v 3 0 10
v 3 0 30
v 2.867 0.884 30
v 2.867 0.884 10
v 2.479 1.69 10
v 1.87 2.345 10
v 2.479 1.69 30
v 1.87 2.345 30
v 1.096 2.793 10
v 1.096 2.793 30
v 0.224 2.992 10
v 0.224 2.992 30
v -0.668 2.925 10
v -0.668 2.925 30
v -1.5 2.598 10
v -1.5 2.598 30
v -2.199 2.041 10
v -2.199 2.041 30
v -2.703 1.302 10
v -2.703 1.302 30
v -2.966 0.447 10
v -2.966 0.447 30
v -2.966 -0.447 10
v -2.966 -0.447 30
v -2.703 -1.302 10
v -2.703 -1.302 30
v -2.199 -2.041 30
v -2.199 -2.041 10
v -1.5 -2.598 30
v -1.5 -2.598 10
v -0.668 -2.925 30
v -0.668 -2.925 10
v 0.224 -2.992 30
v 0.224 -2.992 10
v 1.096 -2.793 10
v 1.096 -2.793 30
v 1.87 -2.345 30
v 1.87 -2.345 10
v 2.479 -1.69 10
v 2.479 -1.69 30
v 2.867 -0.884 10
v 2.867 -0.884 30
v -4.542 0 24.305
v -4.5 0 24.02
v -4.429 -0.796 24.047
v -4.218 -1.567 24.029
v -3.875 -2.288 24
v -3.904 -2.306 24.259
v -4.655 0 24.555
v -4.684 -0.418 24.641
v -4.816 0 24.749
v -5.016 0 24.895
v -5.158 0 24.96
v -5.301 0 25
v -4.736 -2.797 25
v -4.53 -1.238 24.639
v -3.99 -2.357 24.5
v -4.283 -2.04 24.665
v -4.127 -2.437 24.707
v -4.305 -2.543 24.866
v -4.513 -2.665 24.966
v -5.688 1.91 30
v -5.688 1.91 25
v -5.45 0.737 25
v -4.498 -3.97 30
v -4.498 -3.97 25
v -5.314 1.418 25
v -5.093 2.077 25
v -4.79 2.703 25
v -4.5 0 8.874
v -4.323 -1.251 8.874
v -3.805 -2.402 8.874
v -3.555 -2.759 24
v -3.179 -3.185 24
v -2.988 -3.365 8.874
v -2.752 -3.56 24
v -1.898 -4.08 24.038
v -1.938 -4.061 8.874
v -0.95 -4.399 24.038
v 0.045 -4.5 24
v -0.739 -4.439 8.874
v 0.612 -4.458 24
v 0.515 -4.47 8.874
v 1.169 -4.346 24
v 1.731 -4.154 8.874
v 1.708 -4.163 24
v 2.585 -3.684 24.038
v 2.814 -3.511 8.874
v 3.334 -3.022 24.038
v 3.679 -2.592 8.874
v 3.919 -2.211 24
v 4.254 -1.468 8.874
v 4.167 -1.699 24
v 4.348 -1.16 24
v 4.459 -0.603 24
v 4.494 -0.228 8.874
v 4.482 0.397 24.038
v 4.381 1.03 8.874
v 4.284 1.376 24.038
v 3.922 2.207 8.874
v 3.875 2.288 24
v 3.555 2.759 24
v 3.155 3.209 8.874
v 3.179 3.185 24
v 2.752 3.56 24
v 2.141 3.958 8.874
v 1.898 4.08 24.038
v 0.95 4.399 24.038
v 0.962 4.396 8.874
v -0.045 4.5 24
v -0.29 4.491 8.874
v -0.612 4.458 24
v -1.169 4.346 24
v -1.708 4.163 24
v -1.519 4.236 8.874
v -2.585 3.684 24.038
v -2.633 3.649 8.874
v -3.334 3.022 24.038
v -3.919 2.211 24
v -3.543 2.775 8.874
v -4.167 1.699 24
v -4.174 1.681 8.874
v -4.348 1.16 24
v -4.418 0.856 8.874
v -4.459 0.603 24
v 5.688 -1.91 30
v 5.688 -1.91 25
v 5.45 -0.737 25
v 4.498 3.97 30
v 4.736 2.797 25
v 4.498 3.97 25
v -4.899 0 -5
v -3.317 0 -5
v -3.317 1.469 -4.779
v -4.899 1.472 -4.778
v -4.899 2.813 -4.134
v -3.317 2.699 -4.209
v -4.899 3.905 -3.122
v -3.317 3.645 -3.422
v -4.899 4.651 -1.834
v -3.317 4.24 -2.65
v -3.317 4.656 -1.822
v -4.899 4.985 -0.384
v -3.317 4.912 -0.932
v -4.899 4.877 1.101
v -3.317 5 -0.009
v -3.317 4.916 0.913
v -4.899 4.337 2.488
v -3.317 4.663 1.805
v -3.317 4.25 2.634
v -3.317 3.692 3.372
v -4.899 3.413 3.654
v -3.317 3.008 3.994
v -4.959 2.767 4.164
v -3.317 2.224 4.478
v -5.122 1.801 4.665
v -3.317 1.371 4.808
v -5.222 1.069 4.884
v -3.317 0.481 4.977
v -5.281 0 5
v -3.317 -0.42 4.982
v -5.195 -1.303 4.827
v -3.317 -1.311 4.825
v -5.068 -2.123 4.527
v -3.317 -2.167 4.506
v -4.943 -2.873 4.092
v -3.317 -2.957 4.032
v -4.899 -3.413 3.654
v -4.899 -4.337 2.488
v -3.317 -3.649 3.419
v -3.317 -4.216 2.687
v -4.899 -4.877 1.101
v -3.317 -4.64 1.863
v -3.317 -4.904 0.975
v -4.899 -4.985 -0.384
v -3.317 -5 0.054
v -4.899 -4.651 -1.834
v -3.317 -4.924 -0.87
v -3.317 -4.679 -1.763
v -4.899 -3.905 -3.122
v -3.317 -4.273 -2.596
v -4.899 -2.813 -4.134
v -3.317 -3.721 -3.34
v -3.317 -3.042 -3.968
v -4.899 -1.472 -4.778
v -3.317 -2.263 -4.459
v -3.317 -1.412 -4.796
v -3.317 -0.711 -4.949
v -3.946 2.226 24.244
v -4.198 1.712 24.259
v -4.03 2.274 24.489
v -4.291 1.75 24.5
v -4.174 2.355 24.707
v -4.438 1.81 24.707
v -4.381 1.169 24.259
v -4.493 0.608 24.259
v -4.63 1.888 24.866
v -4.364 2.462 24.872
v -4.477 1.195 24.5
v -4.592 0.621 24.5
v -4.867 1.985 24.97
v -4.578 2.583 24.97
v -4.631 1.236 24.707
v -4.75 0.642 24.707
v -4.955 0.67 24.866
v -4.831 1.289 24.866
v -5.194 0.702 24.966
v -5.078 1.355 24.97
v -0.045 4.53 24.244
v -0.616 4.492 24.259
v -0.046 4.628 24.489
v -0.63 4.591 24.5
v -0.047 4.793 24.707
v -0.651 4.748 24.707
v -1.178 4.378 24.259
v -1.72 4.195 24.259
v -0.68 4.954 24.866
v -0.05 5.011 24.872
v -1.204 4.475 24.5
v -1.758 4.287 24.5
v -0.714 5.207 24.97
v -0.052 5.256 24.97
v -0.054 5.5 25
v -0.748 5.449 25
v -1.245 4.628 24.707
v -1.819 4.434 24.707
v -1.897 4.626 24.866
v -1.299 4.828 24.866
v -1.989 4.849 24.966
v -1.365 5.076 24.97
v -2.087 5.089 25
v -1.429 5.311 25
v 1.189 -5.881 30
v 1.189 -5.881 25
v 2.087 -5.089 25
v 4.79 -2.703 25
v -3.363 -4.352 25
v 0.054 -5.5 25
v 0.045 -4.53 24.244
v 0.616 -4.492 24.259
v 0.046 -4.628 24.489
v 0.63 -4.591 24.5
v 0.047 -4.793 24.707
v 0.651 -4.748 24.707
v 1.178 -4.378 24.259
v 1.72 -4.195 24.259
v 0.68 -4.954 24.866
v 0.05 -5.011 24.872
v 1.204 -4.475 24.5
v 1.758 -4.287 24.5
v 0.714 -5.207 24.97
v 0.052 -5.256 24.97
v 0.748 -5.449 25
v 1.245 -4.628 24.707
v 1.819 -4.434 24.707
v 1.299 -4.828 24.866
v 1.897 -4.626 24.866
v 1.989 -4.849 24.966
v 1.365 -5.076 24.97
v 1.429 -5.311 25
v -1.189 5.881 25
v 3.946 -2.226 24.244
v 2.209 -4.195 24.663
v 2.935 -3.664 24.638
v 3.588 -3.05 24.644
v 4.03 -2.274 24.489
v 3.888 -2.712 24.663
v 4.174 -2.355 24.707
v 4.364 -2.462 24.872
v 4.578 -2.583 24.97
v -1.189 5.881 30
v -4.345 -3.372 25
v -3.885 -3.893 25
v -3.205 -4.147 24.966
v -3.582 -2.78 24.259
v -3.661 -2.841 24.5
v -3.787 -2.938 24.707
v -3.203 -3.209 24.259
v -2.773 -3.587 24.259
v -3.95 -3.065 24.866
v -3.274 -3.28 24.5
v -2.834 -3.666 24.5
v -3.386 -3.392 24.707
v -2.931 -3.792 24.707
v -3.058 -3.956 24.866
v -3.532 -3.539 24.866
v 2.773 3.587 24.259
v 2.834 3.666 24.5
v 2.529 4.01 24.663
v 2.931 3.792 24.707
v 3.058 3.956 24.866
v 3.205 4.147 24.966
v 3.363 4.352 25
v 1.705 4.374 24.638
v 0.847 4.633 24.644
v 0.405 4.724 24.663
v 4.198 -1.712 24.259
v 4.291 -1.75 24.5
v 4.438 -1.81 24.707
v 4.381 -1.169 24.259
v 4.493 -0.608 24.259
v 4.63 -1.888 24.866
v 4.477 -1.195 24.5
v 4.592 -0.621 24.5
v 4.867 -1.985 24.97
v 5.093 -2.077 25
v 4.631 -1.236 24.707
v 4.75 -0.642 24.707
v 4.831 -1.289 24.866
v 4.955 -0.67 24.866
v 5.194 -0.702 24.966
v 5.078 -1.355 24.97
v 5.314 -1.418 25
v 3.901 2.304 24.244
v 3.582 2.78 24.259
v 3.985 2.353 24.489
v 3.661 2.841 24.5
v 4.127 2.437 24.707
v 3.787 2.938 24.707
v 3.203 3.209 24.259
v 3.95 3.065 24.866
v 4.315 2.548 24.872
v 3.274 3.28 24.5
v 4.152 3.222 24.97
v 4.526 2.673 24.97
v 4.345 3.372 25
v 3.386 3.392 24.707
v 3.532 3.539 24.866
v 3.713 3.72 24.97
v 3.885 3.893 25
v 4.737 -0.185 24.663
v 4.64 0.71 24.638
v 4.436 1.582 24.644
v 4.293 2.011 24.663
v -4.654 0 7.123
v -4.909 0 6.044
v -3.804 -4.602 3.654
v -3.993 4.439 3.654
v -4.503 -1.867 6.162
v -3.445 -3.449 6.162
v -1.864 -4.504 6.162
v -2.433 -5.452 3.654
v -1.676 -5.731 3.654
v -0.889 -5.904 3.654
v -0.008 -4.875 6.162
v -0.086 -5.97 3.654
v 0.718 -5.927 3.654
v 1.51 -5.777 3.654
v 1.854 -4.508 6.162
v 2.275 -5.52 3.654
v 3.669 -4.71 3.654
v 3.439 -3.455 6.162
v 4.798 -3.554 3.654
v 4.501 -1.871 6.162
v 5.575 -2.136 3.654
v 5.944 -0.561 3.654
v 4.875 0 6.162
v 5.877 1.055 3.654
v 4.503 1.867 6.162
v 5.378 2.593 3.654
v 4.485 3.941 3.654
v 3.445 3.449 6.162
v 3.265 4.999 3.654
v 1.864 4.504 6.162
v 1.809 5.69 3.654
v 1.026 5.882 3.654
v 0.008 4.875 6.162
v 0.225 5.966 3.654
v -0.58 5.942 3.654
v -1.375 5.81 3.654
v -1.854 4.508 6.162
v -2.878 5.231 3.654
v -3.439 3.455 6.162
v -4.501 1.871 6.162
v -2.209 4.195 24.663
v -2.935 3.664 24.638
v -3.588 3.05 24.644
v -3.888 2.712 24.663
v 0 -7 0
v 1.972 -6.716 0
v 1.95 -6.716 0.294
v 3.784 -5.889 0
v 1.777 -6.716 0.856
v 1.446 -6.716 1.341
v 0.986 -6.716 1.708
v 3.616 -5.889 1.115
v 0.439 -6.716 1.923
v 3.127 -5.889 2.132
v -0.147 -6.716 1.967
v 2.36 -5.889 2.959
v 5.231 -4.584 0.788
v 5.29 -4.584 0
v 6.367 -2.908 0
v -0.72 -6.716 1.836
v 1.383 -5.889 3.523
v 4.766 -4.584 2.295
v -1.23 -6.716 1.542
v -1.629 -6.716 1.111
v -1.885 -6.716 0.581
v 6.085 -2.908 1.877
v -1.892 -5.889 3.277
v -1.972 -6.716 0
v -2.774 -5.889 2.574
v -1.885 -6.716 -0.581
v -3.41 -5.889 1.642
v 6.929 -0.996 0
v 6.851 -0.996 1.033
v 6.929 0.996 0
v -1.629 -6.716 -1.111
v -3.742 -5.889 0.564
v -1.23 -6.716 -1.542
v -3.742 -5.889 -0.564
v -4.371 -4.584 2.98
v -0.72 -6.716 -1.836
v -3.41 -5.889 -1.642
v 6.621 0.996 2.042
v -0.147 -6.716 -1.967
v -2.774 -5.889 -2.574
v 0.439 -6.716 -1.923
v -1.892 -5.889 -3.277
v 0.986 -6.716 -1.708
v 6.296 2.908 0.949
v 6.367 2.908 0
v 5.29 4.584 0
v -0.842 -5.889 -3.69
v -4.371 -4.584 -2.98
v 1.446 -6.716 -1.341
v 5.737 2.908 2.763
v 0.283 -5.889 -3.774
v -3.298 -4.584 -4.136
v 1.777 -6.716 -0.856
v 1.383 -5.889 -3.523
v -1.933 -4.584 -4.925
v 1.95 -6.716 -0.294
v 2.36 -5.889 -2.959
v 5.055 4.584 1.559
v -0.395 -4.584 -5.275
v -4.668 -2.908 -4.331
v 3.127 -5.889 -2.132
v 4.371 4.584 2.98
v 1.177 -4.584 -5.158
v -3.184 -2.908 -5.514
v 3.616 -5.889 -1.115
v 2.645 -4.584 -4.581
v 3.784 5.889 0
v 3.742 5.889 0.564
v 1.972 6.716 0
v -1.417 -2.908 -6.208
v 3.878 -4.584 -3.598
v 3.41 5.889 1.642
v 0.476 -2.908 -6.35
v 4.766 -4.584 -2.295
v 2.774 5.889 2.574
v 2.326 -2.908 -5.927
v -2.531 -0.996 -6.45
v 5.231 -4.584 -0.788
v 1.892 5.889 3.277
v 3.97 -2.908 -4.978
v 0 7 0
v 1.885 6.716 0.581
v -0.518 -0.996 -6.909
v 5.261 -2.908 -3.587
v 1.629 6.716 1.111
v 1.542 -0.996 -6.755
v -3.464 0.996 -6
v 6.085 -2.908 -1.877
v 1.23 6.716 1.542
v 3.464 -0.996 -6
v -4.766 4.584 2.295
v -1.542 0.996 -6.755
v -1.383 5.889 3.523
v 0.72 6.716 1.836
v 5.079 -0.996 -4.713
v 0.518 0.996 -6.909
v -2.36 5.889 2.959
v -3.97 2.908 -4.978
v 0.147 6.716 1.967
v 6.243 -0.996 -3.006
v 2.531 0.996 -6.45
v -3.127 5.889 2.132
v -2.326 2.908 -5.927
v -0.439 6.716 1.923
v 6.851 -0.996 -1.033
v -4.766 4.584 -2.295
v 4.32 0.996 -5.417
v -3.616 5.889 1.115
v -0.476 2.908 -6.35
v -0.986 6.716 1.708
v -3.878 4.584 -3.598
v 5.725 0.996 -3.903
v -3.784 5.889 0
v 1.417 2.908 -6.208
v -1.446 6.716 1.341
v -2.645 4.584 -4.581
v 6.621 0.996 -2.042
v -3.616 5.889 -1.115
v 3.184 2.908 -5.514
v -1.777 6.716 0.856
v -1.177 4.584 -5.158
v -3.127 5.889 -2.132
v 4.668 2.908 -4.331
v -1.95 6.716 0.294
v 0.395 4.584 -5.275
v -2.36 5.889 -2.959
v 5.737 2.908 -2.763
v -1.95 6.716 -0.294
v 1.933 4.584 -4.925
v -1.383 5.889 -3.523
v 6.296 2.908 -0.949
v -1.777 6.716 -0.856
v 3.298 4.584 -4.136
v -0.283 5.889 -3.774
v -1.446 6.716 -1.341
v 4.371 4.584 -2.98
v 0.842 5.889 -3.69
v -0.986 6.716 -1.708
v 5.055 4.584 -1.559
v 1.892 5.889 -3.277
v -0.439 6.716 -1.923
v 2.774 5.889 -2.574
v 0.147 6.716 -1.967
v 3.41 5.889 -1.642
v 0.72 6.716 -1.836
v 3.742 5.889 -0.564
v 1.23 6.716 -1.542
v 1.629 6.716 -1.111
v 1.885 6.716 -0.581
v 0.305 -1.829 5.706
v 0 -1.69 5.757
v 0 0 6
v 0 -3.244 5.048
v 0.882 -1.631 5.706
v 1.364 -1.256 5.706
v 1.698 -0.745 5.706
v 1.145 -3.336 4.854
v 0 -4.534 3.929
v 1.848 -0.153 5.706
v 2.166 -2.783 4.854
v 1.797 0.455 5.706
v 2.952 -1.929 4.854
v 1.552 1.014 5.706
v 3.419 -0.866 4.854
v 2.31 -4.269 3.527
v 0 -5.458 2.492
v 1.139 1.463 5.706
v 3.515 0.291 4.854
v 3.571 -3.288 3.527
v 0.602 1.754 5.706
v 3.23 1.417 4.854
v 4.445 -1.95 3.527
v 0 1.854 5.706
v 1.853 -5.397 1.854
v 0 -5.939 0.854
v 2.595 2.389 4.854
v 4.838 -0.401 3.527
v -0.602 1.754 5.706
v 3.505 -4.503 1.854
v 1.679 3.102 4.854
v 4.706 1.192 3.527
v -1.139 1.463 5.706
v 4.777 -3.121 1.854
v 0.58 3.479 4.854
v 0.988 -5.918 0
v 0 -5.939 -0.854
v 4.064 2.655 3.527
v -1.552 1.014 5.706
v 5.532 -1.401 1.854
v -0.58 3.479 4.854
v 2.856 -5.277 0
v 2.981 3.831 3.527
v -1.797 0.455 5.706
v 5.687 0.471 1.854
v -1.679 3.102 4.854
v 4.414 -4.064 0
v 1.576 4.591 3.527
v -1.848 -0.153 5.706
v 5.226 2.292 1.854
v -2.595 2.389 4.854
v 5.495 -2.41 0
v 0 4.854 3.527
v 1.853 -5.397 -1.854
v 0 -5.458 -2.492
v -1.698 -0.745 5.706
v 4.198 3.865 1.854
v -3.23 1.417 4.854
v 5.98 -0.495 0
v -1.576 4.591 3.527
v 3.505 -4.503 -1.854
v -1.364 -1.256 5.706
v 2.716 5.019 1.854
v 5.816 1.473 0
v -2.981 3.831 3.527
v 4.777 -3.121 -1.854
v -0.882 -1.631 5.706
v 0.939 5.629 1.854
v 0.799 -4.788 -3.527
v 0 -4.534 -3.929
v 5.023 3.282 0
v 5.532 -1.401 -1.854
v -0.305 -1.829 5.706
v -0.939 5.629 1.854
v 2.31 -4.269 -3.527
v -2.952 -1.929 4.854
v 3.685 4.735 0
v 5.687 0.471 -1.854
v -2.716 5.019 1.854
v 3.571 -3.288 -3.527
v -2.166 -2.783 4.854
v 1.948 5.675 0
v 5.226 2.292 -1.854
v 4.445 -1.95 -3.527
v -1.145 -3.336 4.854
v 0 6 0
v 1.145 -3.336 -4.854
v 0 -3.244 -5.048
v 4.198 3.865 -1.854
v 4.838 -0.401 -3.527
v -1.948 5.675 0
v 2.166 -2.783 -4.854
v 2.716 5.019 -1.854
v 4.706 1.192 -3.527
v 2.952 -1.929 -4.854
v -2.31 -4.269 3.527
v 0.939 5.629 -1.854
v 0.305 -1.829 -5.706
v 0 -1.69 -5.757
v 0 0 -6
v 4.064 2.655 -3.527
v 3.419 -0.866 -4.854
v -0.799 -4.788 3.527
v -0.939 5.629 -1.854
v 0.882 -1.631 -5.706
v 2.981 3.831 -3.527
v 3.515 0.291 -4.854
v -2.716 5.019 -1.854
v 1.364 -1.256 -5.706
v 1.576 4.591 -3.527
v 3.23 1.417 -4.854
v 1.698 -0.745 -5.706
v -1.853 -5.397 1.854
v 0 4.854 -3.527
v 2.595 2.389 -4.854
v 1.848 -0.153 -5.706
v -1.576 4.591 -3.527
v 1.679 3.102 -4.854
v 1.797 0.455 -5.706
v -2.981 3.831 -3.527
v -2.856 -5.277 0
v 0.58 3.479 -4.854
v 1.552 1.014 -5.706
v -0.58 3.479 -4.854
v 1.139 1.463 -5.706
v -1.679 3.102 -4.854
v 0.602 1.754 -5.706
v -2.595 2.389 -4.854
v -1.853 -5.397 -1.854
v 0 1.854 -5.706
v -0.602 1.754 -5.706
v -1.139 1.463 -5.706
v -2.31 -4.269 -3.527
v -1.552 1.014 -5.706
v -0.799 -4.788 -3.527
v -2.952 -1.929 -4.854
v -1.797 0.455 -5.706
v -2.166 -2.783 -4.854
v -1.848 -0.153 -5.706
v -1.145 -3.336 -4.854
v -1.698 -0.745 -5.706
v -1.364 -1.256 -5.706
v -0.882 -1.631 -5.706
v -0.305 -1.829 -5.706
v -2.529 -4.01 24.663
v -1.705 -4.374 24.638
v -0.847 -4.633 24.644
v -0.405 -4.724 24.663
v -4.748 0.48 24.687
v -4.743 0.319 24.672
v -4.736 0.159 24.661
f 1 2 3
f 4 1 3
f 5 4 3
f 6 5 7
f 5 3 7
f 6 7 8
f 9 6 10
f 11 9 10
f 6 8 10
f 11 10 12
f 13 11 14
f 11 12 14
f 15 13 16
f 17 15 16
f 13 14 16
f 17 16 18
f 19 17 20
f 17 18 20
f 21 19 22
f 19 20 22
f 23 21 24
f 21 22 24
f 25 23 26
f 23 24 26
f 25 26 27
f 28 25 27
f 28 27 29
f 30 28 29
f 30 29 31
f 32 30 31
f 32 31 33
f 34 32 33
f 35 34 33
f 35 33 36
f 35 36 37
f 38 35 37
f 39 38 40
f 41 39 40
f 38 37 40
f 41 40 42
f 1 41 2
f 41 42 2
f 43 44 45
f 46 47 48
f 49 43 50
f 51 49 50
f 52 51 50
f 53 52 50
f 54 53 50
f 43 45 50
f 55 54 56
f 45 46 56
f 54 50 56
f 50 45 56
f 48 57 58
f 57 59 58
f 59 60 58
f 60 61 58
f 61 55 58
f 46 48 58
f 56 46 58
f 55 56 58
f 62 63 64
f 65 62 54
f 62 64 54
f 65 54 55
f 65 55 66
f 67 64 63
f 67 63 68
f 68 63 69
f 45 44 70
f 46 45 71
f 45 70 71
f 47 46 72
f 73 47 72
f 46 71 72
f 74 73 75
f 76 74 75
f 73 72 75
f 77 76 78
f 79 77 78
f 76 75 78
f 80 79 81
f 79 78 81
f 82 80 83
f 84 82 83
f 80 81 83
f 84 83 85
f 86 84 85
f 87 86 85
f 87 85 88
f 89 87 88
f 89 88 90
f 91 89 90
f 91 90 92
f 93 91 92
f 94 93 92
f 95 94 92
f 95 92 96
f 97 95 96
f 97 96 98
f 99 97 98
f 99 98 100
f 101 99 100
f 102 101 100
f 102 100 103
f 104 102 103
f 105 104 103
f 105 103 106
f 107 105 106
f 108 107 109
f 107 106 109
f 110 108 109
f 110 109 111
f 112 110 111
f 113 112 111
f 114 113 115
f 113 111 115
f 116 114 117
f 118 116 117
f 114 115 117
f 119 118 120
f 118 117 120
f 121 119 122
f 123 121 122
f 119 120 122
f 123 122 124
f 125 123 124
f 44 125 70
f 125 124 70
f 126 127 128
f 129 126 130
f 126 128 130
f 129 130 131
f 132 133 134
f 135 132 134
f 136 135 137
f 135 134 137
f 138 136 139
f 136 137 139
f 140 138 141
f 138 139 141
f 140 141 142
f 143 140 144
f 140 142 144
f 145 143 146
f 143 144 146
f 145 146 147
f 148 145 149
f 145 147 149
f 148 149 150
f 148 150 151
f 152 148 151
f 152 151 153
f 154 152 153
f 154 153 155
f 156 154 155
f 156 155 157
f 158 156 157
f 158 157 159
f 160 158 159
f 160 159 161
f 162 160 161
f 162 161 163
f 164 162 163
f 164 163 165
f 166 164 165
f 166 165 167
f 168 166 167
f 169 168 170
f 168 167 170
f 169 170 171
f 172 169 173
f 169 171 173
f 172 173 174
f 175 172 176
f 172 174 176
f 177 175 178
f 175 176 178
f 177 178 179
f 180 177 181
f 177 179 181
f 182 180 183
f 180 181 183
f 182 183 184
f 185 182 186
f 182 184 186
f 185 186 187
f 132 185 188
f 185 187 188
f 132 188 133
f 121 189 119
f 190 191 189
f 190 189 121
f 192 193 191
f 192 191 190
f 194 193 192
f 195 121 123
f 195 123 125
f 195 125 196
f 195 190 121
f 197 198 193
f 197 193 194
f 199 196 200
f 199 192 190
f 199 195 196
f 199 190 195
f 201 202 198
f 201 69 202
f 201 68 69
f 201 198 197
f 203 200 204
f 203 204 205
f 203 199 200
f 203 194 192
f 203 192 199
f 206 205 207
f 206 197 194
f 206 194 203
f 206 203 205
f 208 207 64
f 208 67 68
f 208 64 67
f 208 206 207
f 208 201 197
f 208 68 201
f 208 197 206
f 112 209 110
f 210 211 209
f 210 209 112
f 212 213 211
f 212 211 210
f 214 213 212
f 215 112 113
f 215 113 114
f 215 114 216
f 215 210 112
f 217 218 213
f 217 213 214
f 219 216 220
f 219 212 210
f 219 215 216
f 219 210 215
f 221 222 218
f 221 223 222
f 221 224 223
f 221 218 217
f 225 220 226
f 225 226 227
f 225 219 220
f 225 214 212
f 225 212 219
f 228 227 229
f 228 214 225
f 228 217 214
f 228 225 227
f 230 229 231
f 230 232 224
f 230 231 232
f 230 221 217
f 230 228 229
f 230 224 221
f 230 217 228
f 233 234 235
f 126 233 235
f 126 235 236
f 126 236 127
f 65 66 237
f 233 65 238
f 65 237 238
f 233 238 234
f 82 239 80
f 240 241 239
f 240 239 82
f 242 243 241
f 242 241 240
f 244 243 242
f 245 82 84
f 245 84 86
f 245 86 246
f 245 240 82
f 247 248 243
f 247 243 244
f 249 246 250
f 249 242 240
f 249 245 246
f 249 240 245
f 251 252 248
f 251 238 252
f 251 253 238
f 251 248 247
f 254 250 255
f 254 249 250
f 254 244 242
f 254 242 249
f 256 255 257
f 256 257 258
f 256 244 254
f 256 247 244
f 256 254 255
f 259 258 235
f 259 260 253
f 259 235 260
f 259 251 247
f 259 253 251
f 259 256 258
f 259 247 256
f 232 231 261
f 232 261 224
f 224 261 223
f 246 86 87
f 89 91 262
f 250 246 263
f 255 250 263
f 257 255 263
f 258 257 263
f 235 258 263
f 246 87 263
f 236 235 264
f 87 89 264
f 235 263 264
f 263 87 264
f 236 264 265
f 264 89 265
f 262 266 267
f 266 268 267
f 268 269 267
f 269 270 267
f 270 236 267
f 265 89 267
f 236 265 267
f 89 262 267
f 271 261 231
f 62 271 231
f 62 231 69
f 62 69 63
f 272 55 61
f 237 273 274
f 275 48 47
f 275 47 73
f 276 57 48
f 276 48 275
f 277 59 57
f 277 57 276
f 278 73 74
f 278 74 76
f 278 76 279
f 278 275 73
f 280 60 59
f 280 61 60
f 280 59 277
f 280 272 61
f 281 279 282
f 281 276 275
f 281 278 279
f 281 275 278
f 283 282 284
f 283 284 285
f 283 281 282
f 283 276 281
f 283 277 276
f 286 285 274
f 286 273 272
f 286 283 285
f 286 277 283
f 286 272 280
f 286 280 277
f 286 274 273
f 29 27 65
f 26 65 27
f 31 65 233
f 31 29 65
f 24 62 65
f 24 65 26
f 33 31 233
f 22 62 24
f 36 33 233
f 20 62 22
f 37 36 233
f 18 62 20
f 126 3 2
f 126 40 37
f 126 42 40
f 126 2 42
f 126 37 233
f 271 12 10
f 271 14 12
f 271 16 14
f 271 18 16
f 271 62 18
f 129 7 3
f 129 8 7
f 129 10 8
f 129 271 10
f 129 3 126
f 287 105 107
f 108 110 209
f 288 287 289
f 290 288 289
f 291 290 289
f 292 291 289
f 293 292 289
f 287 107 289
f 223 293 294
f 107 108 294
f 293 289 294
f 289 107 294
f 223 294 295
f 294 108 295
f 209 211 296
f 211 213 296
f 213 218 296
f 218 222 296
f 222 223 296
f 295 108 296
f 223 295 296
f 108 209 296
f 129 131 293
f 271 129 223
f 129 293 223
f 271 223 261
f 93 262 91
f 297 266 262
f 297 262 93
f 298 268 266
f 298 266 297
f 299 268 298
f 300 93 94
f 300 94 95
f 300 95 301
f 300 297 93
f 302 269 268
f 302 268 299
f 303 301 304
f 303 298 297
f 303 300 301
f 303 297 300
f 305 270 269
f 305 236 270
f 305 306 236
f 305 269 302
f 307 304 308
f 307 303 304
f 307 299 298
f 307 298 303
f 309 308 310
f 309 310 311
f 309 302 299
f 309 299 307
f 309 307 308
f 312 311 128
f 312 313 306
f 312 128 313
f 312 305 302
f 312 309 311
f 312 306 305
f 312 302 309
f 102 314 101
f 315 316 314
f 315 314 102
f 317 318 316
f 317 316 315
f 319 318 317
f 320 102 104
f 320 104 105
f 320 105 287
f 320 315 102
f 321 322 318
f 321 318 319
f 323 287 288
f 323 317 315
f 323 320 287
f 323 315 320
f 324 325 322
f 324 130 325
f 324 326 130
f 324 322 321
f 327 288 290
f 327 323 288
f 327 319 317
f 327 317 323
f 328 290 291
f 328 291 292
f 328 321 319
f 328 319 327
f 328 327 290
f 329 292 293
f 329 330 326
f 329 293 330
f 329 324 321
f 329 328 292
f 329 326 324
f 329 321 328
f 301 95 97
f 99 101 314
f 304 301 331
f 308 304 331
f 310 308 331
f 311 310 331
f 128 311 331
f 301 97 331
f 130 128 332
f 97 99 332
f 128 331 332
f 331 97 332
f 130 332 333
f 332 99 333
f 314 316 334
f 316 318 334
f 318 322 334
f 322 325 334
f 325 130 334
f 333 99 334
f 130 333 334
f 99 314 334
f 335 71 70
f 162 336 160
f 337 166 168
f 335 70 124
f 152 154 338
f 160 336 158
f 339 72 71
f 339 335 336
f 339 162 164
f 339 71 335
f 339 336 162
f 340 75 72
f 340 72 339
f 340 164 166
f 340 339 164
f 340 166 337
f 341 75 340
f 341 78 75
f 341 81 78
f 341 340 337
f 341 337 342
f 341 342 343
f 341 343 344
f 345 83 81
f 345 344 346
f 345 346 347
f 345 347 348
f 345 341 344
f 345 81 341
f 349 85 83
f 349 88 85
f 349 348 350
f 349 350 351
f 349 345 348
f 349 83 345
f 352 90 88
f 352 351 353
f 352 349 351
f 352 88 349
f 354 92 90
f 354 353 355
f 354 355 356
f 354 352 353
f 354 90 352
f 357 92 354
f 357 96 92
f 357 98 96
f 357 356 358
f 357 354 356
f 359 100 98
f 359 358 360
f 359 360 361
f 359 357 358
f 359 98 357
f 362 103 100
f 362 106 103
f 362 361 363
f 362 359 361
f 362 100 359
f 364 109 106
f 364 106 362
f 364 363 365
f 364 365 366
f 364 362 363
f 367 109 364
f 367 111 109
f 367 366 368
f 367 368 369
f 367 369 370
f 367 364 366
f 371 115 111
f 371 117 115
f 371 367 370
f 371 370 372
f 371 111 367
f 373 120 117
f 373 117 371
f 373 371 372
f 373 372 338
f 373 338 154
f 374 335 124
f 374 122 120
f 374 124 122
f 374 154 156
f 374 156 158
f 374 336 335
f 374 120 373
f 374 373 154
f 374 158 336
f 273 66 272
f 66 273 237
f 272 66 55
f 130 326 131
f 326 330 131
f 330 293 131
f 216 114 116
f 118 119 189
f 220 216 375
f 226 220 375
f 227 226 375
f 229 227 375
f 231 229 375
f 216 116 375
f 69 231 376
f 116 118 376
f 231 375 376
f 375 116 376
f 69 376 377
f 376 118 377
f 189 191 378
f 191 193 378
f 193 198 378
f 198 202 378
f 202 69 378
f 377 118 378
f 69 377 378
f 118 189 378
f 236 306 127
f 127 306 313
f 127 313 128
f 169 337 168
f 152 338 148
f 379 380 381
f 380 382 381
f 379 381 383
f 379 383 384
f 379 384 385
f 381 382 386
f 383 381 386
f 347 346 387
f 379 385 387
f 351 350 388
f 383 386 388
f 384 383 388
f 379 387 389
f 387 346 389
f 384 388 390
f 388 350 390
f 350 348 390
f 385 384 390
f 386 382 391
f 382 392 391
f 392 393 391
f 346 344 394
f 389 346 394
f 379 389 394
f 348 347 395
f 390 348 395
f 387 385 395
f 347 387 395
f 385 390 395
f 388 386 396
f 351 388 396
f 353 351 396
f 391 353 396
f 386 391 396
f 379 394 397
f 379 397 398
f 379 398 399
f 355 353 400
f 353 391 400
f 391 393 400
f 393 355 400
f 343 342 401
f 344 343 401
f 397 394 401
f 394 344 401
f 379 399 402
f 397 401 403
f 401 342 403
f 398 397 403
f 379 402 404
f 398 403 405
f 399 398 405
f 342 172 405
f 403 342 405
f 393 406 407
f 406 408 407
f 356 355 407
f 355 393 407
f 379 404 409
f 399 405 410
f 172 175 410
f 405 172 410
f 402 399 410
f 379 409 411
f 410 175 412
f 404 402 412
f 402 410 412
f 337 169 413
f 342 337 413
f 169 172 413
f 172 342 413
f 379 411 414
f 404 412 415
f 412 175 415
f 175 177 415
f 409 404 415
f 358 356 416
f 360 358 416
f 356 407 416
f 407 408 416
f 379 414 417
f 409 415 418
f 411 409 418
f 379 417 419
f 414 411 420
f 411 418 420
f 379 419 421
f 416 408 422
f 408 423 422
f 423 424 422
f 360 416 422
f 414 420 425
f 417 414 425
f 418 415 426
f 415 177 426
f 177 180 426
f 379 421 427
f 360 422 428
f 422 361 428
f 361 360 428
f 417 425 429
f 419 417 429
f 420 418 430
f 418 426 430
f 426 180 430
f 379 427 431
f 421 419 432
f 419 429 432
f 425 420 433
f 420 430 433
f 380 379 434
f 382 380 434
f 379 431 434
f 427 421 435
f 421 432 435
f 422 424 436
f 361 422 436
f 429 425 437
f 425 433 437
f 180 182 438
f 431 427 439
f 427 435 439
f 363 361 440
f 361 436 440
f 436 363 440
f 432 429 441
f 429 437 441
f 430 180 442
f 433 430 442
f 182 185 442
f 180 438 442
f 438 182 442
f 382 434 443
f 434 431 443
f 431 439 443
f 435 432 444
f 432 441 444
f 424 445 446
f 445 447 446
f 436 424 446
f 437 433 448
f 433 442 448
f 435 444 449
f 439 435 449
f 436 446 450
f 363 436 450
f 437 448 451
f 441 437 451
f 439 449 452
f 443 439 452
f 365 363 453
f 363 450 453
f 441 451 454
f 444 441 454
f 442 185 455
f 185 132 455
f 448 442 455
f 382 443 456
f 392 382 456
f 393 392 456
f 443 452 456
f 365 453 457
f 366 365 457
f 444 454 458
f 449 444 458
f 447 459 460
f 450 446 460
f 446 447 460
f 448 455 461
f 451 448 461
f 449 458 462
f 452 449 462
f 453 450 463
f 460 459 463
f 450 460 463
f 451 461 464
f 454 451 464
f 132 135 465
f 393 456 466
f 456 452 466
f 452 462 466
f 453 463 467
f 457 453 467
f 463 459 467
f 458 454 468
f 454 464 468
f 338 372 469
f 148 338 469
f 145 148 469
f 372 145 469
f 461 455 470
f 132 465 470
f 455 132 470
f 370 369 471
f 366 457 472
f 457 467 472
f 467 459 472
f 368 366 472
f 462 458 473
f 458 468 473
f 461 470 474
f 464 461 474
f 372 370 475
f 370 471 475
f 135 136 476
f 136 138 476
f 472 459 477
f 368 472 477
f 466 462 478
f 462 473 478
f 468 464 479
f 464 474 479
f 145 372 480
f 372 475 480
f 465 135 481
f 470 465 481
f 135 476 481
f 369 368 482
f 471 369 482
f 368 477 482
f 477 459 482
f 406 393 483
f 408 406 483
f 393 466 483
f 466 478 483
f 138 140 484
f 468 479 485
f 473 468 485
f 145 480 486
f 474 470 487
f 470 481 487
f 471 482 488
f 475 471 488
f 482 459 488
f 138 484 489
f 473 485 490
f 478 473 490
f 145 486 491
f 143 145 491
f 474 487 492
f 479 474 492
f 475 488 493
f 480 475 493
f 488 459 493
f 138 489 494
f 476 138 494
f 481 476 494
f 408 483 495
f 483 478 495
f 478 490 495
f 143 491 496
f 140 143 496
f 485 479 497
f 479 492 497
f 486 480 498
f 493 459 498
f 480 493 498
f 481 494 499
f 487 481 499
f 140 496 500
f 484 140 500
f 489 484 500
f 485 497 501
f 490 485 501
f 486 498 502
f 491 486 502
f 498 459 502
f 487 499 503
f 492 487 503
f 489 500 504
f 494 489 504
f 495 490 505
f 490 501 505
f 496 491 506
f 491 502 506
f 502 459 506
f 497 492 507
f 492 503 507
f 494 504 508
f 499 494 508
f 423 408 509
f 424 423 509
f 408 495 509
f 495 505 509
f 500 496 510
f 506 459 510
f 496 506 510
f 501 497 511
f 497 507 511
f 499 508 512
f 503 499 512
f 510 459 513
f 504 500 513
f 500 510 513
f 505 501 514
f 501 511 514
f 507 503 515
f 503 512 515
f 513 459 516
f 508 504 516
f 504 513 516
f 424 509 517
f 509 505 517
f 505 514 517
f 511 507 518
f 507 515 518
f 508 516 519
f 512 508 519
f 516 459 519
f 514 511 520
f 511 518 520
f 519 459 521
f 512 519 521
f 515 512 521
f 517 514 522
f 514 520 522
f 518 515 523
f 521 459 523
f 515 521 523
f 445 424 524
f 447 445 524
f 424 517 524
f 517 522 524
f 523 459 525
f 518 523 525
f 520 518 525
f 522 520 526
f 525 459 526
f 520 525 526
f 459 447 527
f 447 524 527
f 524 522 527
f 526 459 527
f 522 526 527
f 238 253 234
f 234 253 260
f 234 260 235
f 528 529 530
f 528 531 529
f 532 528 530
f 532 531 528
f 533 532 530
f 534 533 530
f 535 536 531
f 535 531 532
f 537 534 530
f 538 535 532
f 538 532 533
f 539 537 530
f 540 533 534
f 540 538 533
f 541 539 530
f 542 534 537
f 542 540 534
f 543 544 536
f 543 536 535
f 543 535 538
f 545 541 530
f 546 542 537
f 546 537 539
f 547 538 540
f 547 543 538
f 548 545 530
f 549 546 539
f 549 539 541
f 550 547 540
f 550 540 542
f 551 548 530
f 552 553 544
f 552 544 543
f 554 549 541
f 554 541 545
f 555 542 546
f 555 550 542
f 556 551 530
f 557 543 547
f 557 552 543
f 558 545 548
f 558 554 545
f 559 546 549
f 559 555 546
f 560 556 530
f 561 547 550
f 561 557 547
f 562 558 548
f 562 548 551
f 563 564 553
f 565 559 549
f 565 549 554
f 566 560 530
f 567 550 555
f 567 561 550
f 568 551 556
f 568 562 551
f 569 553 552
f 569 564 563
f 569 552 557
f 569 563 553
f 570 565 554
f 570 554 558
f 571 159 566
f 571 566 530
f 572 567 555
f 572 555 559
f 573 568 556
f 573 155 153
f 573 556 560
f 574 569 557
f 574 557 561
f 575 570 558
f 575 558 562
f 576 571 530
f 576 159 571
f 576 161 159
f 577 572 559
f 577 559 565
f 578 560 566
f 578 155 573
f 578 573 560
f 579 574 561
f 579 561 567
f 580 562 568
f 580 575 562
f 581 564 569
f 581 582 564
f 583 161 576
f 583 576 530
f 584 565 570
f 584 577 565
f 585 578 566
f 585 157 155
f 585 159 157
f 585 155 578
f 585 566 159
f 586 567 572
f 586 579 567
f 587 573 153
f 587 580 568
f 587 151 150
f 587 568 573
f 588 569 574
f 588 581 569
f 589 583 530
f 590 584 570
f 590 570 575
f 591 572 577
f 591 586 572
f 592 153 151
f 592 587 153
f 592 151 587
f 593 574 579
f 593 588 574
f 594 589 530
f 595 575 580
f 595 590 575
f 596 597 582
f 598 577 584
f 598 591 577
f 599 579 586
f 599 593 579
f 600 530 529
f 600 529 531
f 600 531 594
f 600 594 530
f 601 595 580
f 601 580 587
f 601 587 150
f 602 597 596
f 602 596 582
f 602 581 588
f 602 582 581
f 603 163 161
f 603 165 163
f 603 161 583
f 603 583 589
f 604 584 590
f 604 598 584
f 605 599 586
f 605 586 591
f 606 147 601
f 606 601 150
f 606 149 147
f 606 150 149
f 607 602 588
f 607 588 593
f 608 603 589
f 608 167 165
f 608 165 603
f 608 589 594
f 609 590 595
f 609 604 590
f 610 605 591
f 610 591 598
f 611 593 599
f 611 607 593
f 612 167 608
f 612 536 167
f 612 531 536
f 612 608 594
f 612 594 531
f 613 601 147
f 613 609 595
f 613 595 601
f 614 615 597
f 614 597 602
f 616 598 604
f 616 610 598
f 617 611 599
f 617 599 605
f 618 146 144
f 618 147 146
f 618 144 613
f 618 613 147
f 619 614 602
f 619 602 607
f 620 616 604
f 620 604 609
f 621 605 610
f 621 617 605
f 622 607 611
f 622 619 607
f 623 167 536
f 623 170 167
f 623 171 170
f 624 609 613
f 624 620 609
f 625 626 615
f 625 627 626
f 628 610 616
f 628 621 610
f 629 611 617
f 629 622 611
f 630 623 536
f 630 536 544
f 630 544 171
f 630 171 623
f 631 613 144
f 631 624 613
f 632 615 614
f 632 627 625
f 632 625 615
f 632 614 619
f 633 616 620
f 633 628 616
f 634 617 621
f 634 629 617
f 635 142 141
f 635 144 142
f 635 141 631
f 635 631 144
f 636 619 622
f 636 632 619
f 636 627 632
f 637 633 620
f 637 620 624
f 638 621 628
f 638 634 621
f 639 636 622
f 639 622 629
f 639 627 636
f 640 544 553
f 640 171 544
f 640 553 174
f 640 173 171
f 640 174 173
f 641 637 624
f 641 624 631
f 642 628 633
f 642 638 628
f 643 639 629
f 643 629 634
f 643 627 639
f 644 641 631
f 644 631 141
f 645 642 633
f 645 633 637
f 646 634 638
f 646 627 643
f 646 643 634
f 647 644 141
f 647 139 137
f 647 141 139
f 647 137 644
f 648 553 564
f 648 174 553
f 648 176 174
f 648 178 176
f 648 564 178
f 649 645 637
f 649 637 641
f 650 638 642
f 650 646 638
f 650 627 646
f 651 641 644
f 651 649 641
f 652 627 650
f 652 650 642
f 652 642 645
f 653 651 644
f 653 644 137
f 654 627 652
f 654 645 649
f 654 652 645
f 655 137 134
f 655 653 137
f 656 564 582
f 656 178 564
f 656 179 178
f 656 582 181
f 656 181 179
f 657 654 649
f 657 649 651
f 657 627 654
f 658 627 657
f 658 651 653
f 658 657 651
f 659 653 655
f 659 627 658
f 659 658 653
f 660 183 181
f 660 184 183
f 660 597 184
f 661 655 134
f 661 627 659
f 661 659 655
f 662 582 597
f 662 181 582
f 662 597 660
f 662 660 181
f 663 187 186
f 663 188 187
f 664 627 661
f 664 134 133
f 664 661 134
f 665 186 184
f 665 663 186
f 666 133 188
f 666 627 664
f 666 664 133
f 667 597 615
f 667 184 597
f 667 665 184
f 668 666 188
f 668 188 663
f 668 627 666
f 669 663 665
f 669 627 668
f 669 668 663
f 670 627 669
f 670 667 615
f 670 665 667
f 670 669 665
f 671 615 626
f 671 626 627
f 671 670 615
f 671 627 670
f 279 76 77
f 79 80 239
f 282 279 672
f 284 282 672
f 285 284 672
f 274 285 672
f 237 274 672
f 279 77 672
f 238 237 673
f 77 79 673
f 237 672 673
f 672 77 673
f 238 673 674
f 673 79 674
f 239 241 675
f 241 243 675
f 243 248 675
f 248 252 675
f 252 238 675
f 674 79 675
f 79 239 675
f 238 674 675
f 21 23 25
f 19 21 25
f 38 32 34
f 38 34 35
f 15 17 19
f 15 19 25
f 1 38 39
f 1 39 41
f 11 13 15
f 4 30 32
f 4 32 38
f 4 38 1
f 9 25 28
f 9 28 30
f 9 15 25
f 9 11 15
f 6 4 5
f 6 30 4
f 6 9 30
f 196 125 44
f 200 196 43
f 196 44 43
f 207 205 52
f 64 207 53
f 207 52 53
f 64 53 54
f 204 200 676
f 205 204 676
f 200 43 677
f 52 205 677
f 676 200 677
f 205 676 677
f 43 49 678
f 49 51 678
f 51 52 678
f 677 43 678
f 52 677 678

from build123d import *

# Parameters (mm, degrees)
SKETCH2_R           = 4.5
BOSS_EXTRUDE1_DEPTH = 25
BOSS_EXTRUDE2_DEPTH = 5
SKETCH4_R           = 3
CUT_EXTRUDE1_DEPTH  = 20
FILLET1_R           = 10
FILLET3_R           = 1
SKETCH6_R           = 5
CUT_EXTRUDE2_DEPTH  = 20


with BuildPart() as part:
    # Sketch1 → Revolve1 (revolve)
    with BuildSketch(Plane.XY):
        with BuildLine():
            Line((0, 7), (0, -7))
            ThreePointArc((0, -7), (7, 0), (0, 7))
        make_face()
    revolve(axis=Axis((0, 7, 0), (0, -1, 0)))

    # Sketch2 → Boss-Extrude1 (add)
    with BuildSketch(Plane.XY):
        with Locations(Location((0, 0, 0), (0, 0, 180))):
            Circle(SKETCH2_R)
    extrude(amount=BOSS_EXTRUDE1_DEPTH)

    # Sketch3 → Boss-Extrude2 (add)
    with BuildSketch(Plane.XY.offset(25)):
        Polygon((5.687720884, -1.910453125), (4.498361381, 3.970484213), (-1.189359503, 5.880937338), (-5.687720884, 1.910453125), (-4.498361381, -3.970484213), (1.189359503, -5.880937338), align=None)
    extrude(amount=BOSS_EXTRUDE2_DEPTH)

    # Sketch4 → Cut-Extrude1 (cut)
    with BuildSketch(Plane.XY.offset(30)):
        Circle(SKETCH4_R)
    extrude(amount=-CUT_EXTRUDE1_DEPTH, mode=Mode.SUBTRACT)

    # Fillet1
    fillet1_edges = [part.edges().sort_by_distance(p)[0] for p in [
        (4.5, 0, 5.361902647),
    ]]
    fillet(fillet1_edges, radius=FILLET1_R)

    # Fillet3
    fillet3_edges = [part.edges().sort_by_distance(p)[0] for p in [
        (4.5, 0, 25),
    ]]
    fillet(fillet3_edges, radius=FILLET3_R)

    # Sketch5 → Cut-Revolve1 (revolve, cut)
    with BuildSketch(Plane(origin=(0, 0, 0), x_dir=(0, 0, -1), z_dir=(1, 0, 0))):
        with BuildLine():
            Line((6, 0), (-6, 0))
            ThreePointArc((-6, 0), (0, -6), (6, 0))
        make_face()
    revolve(axis=Axis((0, 0, -6), (0, 0, 1)), mode=Mode.SUBTRACT)

    # Sketch6 → Cut-Extrude2 (cut)
    with BuildSketch(Plane(origin=(0, 0, 0), x_dir=(0, 0, -1), z_dir=(1, 0, 0))):
        Circle(SKETCH6_R)
    extrude(amount=-CUT_EXTRUDE2_DEPTH, mode=Mode.SUBTRACT)


solid = part.part
